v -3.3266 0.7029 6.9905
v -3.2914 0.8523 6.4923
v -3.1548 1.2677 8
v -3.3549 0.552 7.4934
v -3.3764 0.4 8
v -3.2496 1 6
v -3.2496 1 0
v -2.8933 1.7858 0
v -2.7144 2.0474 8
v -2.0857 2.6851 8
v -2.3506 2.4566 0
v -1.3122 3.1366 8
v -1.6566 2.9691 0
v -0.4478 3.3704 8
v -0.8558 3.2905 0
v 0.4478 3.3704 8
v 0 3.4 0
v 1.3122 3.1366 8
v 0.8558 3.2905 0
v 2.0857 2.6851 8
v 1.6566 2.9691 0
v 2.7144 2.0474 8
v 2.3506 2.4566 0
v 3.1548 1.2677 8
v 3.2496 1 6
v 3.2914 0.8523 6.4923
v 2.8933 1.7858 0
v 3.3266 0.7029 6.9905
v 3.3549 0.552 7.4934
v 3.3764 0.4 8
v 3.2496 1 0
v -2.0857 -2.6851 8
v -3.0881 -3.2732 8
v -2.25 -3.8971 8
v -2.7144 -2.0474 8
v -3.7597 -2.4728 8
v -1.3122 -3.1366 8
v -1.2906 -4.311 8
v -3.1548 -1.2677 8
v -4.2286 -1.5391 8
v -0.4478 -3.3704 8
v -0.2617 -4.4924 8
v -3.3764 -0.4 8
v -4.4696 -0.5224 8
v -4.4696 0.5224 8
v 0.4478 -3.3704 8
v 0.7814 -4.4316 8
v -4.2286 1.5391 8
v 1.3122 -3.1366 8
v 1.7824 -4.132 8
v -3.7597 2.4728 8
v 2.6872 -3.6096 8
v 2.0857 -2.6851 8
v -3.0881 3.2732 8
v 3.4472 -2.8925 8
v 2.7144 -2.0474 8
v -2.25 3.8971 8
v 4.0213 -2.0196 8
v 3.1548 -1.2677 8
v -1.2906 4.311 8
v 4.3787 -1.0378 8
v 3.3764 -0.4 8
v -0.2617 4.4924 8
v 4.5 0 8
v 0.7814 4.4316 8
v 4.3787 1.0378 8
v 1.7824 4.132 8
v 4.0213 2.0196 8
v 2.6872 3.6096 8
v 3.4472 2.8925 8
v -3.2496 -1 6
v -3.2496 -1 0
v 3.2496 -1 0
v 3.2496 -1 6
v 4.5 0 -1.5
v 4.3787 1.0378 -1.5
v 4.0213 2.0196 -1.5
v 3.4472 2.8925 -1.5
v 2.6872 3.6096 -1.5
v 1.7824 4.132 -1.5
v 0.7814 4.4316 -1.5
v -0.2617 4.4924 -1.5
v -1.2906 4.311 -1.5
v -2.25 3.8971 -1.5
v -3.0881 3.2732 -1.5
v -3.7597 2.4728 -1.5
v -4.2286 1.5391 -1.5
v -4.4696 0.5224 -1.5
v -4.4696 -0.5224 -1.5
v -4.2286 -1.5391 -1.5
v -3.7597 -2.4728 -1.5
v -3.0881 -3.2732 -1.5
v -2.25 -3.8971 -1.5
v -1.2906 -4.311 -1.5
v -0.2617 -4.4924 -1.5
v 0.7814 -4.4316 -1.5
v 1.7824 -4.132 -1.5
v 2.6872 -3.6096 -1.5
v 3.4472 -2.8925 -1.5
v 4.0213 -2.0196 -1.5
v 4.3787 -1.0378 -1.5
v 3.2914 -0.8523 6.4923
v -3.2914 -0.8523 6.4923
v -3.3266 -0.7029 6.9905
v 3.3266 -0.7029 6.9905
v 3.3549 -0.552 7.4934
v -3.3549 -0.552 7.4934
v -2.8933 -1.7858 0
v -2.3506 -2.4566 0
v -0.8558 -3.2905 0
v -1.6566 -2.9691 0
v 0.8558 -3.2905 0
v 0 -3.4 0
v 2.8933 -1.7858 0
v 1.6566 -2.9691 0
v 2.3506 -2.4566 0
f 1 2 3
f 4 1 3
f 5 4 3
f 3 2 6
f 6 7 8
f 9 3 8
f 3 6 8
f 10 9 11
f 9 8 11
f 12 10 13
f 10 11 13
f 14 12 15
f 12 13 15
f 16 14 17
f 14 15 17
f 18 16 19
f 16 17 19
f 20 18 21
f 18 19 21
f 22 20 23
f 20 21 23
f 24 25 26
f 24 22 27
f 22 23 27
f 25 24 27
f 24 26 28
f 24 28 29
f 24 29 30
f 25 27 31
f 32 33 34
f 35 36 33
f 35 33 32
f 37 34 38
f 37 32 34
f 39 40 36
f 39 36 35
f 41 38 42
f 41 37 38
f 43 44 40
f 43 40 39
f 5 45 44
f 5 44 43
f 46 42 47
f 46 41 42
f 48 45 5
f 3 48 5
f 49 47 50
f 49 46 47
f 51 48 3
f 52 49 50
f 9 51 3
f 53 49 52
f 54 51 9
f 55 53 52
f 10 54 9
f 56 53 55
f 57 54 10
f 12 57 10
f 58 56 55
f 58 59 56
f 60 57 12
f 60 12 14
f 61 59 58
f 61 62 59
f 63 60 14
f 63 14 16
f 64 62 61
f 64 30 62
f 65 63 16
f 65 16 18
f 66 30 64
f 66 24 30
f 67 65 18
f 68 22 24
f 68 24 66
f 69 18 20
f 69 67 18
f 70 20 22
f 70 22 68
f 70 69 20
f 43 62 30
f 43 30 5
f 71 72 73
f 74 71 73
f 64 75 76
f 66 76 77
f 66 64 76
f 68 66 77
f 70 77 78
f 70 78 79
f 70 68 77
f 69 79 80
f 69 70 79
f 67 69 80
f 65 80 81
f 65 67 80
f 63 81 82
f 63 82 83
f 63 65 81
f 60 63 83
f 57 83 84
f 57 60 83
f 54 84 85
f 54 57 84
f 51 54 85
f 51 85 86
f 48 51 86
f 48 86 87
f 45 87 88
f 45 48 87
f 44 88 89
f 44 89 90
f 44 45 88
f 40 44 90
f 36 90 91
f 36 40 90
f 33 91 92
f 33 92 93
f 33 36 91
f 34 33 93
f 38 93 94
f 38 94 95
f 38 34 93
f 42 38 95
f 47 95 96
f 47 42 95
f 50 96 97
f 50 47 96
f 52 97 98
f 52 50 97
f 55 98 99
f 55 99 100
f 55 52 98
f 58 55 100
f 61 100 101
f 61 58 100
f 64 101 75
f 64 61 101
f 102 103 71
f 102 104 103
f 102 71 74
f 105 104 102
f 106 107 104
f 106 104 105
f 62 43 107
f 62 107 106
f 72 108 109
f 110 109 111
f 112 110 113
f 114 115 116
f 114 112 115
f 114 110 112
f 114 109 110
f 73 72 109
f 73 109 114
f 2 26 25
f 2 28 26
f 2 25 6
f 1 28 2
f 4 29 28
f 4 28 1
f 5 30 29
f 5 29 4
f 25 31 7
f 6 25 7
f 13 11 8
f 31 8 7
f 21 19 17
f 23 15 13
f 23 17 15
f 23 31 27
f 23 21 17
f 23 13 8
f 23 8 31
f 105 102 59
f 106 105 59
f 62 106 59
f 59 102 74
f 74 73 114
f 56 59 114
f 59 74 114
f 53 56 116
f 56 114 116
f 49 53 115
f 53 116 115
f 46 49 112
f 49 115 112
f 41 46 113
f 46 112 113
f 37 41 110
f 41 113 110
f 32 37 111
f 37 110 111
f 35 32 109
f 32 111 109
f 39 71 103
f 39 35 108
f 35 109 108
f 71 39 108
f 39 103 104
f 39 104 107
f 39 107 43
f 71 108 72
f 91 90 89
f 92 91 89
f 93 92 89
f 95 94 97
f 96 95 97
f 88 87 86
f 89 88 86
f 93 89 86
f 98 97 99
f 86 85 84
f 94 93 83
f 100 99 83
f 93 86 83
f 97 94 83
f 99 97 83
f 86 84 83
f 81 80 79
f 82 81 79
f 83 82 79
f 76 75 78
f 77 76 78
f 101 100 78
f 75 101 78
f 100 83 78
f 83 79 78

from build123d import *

# Parameters (mm, degrees)
F0_R       = 4.5
F1_DEPTH   = 8
F2_SIZE2   = 0.6
F2_SIZE    = 2
F2_2_SIZE2 = 0.6
F2_2_SIZE  = 2
F3_DEPTH   = 1.5


# Not quite as in the source:
# - a feature names something its author has since deleted; it is built from what else it names


with BuildPart() as f1:
    # F0 (on Top) → F1 (new body)
    with BuildSketch(Plane.XY):
        Circle(F0_R)
        with BuildLine():
            ThreePointArc((3.2496153619, 1), (3.3621936463, 0.5056222749), (3.4, 0))
            ThreePointArc((3.4, 0), (3.3621936463, -0.5056222749), (3.2496153619, -1))
            ThreePointArc((3.2496153619, -1), (0, -3.4), (-3.2496153619, -1))
            ThreePointArc((-3.2496153619, -1), (-3.4, 0), (-3.2496153619, 1))
            ThreePointArc((-3.2496153619, 1), (0, 3.4), (3.2496153619, 1))
        make_face(mode=Mode.SUBTRACT)
        with BuildLine():
            ThreePointArc((3.2496153619, -1), (3.3621936463, -0.5056222749), (3.4, 0))
            ThreePointArc((3.4, 0), (3.3621936463, 0.5056222749), (3.2496153619, 1))
            Line((3.2496153619, 1), (-3.2496153619, 1))
            ThreePointArc((-3.2496153619, 1), (-3.4, 0), (-3.2496153619, -1))
            Line((-3.2496153619, -1), (3.2496153619, -1))
        make_face()
    extrude(amount=F1_DEPTH)

    # F2
    f2_edges = [f1.edges().sort_by_distance(p)[0] for p in [
        (0, 1, 8),
    ]]
    f2_side = f1.faces().sort_by_distance((0, 1, 4))[0]
    chamfer(f2_edges, length=F2_SIZE, length2=F2_SIZE2, reference=f2_side)

    # F2#2
    f2_2_edges = [f1.edges().sort_by_distance(p)[0] for p in [
        (0, -1, 8),
    ]]
    f2_2_side = f1.faces().sort_by_distance((0, -1, 4))[0]
    chamfer(f2_2_edges, length=F2_2_SIZE, length2=F2_2_SIZE2, reference=f2_2_side)

    # F0 (on Top) → F3 (join)
    with BuildSketch(Plane.XY):
        Circle(F0_R)
        with BuildLine():
            ThreePointArc((3.2496153619, 1), (3.3621936463, 0.5056222749), (3.4, 0))
            ThreePointArc((3.4, 0), (3.3621936463, -0.5056222749), (3.2496153619, -1))
            ThreePointArc((3.2496153619, -1), (0, -3.4), (-3.2496153619, -1))
            ThreePointArc((-3.2496153619, -1), (-3.4, 0), (-3.2496153619, 1))
            ThreePointArc((-3.2496153619, 1), (0, 3.4), (3.2496153619, 1))
        make_face(mode=Mode.SUBTRACT)
        with BuildLine():
            ThreePointArc((3.2496153619, -1), (3.3621936463, -0.5056222749), (3.4, 0))
            ThreePointArc((3.4, 0), (3.3621936463, 0.5056222749), (3.2496153619, 1))
            Line((3.2496153619, 1), (-3.2496153619, 1))
            ThreePointArc((-3.2496153619, 1), (-3.4, 0), (-3.2496153619, -1))
            Line((-3.2496153619, -1), (3.2496153619, -1))
        make_face()
        with BuildLine():
            Line((-3.2496153619, 1), (3.2496153619, 1))
            ThreePointArc((3.2496153619, 1), (0, 3.4), (-3.2496153619, 1))
        make_face()
        with BuildLine():
            ThreePointArc((-3.2496153619, -1), (0, -3.4), (3.2496153619, -1))
            Line((3.2496153619, -1), (-3.2496153619, -1))
        make_face()
    extrude(amount=-F3_DEPTH)


solid = f1.part
